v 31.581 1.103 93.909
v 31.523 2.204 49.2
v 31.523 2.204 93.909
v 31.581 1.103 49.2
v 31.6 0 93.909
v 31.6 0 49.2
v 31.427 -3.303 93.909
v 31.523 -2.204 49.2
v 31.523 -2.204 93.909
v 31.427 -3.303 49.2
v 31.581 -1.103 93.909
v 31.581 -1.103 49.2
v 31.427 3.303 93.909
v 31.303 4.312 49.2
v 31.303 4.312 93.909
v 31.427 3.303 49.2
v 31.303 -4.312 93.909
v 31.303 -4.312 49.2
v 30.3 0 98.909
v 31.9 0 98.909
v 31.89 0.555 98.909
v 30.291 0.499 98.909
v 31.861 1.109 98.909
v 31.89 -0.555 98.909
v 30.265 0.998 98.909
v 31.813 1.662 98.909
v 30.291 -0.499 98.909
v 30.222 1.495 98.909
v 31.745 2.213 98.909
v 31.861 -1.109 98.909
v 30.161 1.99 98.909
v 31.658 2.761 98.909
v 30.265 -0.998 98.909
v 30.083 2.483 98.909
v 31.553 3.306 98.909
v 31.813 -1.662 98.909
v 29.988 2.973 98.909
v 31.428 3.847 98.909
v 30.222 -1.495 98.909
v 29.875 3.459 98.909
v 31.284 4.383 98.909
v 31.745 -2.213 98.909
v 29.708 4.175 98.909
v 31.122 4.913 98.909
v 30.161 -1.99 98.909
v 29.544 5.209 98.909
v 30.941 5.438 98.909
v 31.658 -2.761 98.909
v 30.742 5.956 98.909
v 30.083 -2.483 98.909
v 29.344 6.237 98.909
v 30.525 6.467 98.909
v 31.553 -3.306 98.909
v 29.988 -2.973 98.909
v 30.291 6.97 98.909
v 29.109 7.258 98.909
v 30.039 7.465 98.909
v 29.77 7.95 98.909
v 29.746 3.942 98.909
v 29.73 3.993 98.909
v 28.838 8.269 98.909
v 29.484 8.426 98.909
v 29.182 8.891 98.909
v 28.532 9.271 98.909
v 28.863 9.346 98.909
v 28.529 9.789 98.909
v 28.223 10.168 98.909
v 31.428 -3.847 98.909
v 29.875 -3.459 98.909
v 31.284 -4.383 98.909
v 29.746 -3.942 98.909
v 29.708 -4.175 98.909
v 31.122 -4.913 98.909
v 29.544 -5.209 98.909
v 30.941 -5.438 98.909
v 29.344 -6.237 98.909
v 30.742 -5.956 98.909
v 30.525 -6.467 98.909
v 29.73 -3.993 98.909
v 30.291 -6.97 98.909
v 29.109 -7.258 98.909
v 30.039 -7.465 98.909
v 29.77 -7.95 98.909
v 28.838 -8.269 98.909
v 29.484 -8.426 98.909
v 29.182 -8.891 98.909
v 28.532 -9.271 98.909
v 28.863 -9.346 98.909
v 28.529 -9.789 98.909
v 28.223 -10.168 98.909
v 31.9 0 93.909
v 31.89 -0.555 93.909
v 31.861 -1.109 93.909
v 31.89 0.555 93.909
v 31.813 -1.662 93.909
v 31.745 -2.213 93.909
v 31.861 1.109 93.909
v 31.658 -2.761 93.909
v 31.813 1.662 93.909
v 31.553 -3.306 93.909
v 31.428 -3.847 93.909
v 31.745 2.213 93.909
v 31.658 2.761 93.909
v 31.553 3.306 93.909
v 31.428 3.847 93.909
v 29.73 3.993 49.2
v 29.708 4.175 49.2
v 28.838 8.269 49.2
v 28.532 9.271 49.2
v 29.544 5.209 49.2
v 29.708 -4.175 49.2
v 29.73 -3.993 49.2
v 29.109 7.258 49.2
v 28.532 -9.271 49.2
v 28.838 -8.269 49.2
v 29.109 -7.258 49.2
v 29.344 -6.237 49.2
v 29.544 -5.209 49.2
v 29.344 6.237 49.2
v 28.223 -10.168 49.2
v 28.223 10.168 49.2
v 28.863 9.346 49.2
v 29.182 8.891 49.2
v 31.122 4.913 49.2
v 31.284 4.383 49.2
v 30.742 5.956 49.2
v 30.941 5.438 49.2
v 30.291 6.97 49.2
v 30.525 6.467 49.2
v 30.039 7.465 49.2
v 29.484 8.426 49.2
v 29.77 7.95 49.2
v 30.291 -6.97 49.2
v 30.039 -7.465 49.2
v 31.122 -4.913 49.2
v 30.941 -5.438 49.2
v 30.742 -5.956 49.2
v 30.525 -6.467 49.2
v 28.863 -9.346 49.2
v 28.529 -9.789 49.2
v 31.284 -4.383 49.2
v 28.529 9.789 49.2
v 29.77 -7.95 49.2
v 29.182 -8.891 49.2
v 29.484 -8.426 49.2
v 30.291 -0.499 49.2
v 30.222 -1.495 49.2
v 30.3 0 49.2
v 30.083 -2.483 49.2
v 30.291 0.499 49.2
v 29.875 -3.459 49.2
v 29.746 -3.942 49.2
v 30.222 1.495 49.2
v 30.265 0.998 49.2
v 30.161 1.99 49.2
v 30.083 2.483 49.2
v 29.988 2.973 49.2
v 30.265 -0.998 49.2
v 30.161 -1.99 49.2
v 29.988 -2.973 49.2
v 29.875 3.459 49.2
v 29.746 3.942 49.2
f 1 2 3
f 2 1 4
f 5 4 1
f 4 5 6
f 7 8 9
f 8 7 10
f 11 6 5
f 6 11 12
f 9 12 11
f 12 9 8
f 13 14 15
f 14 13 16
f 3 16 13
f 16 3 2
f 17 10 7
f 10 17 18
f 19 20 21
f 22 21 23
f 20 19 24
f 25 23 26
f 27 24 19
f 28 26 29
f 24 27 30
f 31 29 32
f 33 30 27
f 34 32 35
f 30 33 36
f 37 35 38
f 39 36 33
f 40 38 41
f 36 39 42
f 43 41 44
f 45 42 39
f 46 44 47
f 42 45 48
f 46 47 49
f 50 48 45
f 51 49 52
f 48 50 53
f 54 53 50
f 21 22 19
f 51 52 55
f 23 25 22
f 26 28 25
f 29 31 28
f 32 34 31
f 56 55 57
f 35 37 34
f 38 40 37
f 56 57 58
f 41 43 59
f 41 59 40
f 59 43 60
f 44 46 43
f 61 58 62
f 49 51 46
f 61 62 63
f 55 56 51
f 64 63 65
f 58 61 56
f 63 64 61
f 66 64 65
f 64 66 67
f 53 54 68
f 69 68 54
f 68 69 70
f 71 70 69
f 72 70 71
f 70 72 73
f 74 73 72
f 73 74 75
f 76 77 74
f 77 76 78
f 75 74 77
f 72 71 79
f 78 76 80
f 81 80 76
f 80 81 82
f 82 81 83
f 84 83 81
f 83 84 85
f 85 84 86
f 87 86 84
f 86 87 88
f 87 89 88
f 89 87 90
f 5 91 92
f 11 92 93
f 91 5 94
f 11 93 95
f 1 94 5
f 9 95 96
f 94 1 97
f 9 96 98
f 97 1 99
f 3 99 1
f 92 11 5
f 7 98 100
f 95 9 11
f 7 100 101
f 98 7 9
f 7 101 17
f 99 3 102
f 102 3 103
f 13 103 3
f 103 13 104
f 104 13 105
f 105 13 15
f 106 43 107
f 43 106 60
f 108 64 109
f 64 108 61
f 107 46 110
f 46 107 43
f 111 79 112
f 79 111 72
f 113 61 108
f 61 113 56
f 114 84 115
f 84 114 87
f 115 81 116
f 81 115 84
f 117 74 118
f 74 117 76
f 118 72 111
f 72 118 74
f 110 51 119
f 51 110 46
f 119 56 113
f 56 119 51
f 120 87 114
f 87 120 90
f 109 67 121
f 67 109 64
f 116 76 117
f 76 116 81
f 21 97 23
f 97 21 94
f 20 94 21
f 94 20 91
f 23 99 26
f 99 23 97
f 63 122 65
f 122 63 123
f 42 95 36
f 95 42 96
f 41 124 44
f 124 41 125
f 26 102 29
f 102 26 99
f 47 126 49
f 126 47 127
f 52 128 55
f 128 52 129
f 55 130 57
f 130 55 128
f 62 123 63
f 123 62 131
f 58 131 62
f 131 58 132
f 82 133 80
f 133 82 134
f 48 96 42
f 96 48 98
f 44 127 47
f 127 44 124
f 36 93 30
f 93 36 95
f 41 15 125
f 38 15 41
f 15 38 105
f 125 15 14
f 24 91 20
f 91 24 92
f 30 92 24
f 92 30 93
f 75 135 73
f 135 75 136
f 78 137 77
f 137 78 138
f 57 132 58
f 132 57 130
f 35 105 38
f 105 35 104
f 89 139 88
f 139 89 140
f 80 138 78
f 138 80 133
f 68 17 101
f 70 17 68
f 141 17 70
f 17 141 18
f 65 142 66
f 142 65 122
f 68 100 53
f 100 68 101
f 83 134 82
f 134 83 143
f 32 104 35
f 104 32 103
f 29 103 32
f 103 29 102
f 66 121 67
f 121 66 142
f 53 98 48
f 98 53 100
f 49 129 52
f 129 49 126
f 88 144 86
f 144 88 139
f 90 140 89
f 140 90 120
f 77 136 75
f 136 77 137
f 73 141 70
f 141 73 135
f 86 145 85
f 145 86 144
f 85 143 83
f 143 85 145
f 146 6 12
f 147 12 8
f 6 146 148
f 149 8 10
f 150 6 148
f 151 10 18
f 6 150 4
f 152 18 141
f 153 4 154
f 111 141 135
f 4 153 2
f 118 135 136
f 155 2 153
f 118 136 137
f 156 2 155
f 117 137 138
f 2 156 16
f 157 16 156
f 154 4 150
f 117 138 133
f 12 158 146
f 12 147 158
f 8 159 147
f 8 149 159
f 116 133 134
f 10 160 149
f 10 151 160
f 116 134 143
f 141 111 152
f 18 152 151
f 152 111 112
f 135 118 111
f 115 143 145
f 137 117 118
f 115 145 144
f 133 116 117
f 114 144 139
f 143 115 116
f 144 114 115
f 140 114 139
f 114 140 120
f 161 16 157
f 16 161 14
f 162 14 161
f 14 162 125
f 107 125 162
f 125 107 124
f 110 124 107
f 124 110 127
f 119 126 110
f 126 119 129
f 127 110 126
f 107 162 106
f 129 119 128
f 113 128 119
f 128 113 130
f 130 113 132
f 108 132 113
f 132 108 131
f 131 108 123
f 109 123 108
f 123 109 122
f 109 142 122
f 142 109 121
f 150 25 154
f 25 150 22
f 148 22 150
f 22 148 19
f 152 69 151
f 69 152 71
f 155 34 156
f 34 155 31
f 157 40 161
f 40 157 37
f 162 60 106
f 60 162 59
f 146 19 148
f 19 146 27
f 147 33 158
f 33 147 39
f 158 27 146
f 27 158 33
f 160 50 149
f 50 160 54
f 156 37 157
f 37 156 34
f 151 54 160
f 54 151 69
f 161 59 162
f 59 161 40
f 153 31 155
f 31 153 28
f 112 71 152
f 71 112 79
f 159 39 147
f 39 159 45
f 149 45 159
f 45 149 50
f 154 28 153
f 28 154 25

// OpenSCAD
// file: lid.scad
// ─────────────────────────────────────────────────────────────
//  Lid + Mariotte standpipe, one part.
//  PRINT PLATE-TOP-DOWN. Origin = plate underside = chamber rim.
// ─────────────────────────────────────────────────────────────
include <legacy_params.scad>

sp_len = lid_pos_z - (ch_floor + water_level);   // lid down to the level

module lid() {
    difference() {
        union() {
            cylinder(d = ch_flange_od, h = lid_t);
            translate([0, 0, -lid_spigot_h])
                cylinder(d = ch_id - 2*lid_fit, h = lid_spigot_h + eps);
            translate([sp_offset, 0, -sp_len])
                cylinder(d = sp_od, h = sp_len + eps);
        }
        // uniform bore: bottle neck socket at the top, air/water path below
        translate([sp_offset, 0, -sp_len - eps])
            cylinder(d = sp_bore, h = sp_len + lid_t + 2*eps);
        // make-up air vents (chamber must breathe or the siphon stalls)
        for (i = [0 : vent_n - 1])
            rotate([0, 0, i*360/vent_n + 40])
                translate([ch_id/2 - 8, 0, -lid_spigot_h - eps])
                    cylinder(d = vent_d, h = lid_spigot_h + lid_t + 2*eps);
        // cable notch, aligned with the chamber's
        translate([-cable_notch_w/2, -ch_flange_od/2 - eps, -lid_spigot_h - eps])
            cube([cable_notch_w, ch_flange_w + ch_wall + eps, lid_spigot_h + lid_t + 2*eps]);
        // finger cutout
        translate([0, ch_flange_od/2 + lid_finger_d*0.30, -lid_spigot_h - eps])
            cylinder(d = lid_finger_d, h = lid_spigot_h + lid_t + 2*eps);
    }
}
lid();
// file: chamber.scad
// ─────────────────────────────────────────────────────────────
//  Fog chamber — cylindrical, fed by the Mariotte standpipe in
//  the lid. Prints upright, open end up: no support anywhere.
//  PETG, 100 um, >=4 perimeters.
// ─────────────────────────────────────────────────────────────
include <legacy_params.scad>

module chamber() {
    difference() {
        union() {
            cylinder(d = ch_od, h = ch_floor + ch_inner_h);
            // rim flange: gives the lid a real seat on a thin-walled tube
            translate([0, 0, ch_floor + ch_inner_h - ch_flange_h])
                cylinder(d = ch_flange_od, h = ch_flange_h);
            translate([0, ch_od/2 - eps, ch_floor + fog_port_z])
                teardrop(fog_port_d + 2*fog_boss_wall, fog_boss_len);
        }
        // cavity
        translate([0, 0, ch_floor])
            cylinder(d = ch_id, h = ch_inner_h + eps);
        // fog outlet bore
        translate([0, 0, ch_floor + fog_port_z])
            teardrop(fog_port_d, ch_od);
        // module locating recess
        translate([0, 0, -eps])
            cylinder(d = mm_module_od + 1.0, h = mm_recess_d + eps);
        // cable exit notch in the rim — no penetration below water
        translate([-cable_notch_w/2, -ch_flange_od/2 - eps,
                   ch_floor + ch_inner_h - cable_notch_h])
            cube([cable_notch_w, ch_flange_w + ch_wall + 2*eps, cable_notch_h + eps]);
    }
}
chamber();
// file: legacy_params.scad
// Parameters that only the superseded parts still use.
//
// They were removed from ../params.scad when the designs that needed
// them were retired, so that the live file describes exactly one
// build and nothing else. Kept here so these files still open and
// render for reference. DO NOT PRINT ANYTHING FROM THIS DIRECTORY -
// see README.md.
include <../params.scad>

// The module was thought to sit 1.5 mm down in a locating recess.
mm_recess_d       = 1.5;
// The water band as it was believed to be before the module was
// measured and MIST-MAKER.md was written: 41-50 mm, not 20-75.
water_start       = 41;
water_best_lo     = 42;
water_best_hi     = 45;
water_struggle    = 50;
plain_ml          = 445;

// Internal Mariotte standpipe, hung from the lid beside the module.
// Impossible once the module turned out to be 45 mm TALL as well as
// Ø45: a pipe alongside it needs a Ø80 bore.
sp_bore           = 28.6;
sp_wall           = 1.6;
sp_od             = sp_bore + 2*sp_wall;
sp_offset         = 16;
sp_socket_depth   = 18;

// TPU neck washer, replaced by the captured bottle cap's own liner.
gasket_od         = 36;
gasket_id         = 29;
gasket_t          = 2.0;

// Fog port as a hole in a lid, before the fan and nozzle existed.
fog_port_d        = 25;
fog_port_z        = 70;
fog_boss_len      = 10;
fog_boss_wall     = 2.0;
fog_collar_h      = 6.0;

// Cut-PET-bottle vessel and its lid.
vessel_od         = 90;
vessel_cut_h      = 80;
vessel_lid        = 1;
skirt_h           = 14;
skirt_wall        = 2.0;
skirt_slop        = 5;
plate_t           = 3.0;
lip_h             = 6.0;
vl_vent_d         = 13;
vl_vent_n         = 4;

// Cable notch in the rim, replaced by a bung hole in the lid: a
// notch leaks fog down the outside of the chamber.
cable_notch_w     = mm_cable_od + 3;
cable_notch_h     = 6;

// Printed cap-chamber alternative.
cc_id    = 58;
cc_wall  = 1.6;
cc_od    = cc_id + 2*cc_wall;
cc_water = mm_module_h + 25;
cc_head  = 40;
cc_h     = cc_water + cc_head;
cc_flange = 3;

// Lid vents and placement, from before the fan/nozzle pair existed.
vent_d            = 12;
vent_n            = 5;
water_level       = water_hold;
lid_pos_z         = ch_floor + ch_inner_h;
lid_pos_xy        = 0;
fog_headspace_old = 42;

// cap_chamber.scad selects its part with this.
PART              = "cup";
// main file
// Interference solid: lid seated on the chamber. Must be empty.
include <legacy_params.scad>
use <chamber.scad>
use <lid.scad>
intersection() {
    chamber();
    translate([lid_pos_xy, lid_pos_xy, lid_pos_z]) lid();
}
